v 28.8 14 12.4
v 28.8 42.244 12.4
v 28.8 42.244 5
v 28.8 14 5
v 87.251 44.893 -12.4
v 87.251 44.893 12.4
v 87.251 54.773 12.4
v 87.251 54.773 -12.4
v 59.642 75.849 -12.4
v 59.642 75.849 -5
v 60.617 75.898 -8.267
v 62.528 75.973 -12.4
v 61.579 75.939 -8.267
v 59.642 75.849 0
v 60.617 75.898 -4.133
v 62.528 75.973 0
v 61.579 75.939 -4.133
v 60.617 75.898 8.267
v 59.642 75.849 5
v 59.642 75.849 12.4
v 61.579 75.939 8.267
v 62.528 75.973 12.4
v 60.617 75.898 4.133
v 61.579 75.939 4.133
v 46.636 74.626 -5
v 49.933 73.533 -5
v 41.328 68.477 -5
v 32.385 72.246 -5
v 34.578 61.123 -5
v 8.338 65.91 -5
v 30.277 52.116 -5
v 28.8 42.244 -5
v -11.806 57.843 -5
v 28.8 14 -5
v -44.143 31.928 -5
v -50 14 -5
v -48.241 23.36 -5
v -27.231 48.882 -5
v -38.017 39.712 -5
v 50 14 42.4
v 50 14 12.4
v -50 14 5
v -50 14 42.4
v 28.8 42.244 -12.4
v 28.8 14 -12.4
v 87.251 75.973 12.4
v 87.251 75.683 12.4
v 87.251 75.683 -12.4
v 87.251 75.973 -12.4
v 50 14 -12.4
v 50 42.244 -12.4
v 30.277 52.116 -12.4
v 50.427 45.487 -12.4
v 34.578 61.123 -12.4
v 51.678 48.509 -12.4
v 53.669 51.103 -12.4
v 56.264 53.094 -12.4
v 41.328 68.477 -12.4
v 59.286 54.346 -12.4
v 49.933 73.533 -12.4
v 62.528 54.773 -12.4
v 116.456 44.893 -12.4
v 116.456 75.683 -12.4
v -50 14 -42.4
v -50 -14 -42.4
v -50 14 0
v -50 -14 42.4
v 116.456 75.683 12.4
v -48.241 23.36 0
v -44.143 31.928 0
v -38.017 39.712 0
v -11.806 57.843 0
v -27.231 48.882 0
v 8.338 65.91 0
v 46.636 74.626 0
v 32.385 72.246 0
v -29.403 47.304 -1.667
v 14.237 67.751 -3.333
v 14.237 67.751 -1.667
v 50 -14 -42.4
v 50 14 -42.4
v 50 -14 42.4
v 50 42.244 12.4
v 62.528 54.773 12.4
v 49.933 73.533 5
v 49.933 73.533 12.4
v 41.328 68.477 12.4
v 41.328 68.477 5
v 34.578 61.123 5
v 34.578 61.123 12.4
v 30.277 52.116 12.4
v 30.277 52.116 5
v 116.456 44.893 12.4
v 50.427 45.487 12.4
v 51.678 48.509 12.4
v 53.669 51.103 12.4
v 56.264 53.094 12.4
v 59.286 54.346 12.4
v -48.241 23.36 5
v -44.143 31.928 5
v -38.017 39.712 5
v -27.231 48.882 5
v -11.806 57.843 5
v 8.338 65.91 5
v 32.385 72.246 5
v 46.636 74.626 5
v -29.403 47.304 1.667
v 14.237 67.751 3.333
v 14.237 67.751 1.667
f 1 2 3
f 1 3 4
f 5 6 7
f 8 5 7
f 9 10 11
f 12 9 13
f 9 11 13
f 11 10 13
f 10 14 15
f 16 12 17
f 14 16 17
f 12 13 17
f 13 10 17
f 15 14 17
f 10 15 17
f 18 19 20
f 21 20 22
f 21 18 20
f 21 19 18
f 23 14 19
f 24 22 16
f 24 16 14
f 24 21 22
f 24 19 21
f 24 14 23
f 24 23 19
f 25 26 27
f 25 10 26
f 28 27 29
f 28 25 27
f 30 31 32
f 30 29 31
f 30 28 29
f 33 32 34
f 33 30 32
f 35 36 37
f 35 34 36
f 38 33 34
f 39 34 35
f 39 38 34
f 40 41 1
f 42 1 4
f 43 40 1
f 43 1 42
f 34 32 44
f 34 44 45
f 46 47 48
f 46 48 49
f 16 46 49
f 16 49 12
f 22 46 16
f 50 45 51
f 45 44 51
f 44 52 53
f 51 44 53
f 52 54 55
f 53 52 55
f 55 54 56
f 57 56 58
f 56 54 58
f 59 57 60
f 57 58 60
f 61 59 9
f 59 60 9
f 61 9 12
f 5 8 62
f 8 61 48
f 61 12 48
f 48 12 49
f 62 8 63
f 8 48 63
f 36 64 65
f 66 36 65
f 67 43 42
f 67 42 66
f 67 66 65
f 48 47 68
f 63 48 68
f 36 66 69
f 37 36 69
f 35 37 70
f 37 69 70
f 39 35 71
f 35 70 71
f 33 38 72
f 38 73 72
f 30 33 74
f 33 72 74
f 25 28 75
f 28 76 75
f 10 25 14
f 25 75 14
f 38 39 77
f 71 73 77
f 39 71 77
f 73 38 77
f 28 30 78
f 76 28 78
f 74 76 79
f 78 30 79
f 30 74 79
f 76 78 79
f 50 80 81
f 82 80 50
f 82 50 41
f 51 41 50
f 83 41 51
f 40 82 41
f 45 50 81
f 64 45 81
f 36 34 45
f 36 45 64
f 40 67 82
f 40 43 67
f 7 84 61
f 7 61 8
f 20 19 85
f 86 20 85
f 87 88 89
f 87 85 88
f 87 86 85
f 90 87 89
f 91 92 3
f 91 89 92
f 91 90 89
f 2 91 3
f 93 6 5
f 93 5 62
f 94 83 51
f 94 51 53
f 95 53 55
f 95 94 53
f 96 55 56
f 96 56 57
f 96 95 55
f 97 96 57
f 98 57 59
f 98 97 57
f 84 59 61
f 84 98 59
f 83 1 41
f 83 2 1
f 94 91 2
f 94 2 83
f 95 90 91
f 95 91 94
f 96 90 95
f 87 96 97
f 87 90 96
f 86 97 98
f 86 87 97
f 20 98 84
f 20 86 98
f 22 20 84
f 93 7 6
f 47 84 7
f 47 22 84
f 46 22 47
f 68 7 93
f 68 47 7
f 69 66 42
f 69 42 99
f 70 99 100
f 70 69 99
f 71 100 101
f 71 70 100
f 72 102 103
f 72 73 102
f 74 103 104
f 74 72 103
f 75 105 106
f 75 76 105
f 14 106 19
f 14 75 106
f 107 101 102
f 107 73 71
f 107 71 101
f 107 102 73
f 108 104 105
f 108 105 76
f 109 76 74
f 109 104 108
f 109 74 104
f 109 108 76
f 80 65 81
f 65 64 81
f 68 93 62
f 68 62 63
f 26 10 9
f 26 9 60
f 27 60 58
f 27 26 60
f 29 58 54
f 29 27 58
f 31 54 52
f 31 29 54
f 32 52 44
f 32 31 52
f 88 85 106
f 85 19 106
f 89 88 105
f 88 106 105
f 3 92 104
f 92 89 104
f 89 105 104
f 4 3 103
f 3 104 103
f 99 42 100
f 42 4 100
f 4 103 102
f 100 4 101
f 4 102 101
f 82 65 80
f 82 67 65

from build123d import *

# Parameters (mm, degrees)
F1_DEPTH = 42.4
F0_W     = 29.2045593262
F0_H     = 20.9105454808
F0_H_2   = 9.8793879763
F2_DEPTH = 12.4
F3_DEPTH = 5


with BuildPart() as f1:
    # F0 (on Top) → F1 (new body, symmetric)
    with BuildSketch(Plane.XY):
        Polygon((-50, -14), (50, -14), (50, 14), (28.8000002503, 14), (-50, 14), align=None)
    extrude(amount=F1_DEPTH, both=True)

    # F0 (on Top) → F2 (join, symmetric)
    with BuildSketch(Plane.XY):
        with BuildLine():
            Line((28.8000002503, 14), (50, 14))
            Line((50, 14), (50, 42.2444418685))
            ThreePointArc((50, 42.2444418685), (53.6694869302, 51.1033669823), (62.528412044, 54.7728539125))
            Line((62.528412044, 54.7728539125), (87.2514024377, 54.7728539125))
            Line((87.2514024377, 54.7728539125), (87.2514024377, 75.6833993933))
            Line((87.2514024377, 75.6833993933), (87.2514024377, 75.9728536622))
            Line((87.2514024377, 75.9728536622), (62.528412044, 75.9728536622))
            add(Edge.make_bspline(
                [(59.6423828035, 75.8491528083), (60.623221152, 75.9014989859), (61.5857310507, 75.9427206922), (62.528412044, 75.9728536622)],
                knots=[125.3288073091, 125.3288073091, 125.3288073091, 125.3288073091, 128.4650851718, 128.4650851718, 128.4650851718, 128.4650851718], degree=3))
            ThreePointArc((59.6423828035, 75.8491528083), (37.6793985345, 65.0508508301), (28.8000002503, 42.2444418685))
            Line((28.8000002503, 42.2444418685), (28.8000002503, 14))
        make_face()
        with Locations((101.8536821008, 65.2281266529)):
            Rectangle(F0_W, F0_H)
        with Locations((101.8536821008, 49.8331599243)):
            Rectangle(F0_W, F0_H_2)
    extrude(amount=F2_DEPTH, both=True)

    # F0 (on Top) → F3 (join, symmetric)
    with BuildSketch(Plane.XY):
        with BuildLine():
            add(Edge.make_bspline(
                [(-50, 14), (-48.0165507364, 53.9010766579), (20.4470991711, 73.7573470777), (59.6423828035, 75.8491528083)],
                knots=[0, 0, 0, 0, 125.3288073091, 125.3288073091, 125.3288073091, 125.3288073091], degree=3))
            Line((-50, 14), (28.8000002503, 14))
            Line((28.8000002503, 14), (28.8000002503, 42.2444418685))
            ThreePointArc((28.8000002503, 42.2444418685), (37.6793985345, 65.0508508301), (59.6423828035, 75.8491528083))
        make_face()
    extrude(amount=F3_DEPTH, both=True)


solid = f1.part
